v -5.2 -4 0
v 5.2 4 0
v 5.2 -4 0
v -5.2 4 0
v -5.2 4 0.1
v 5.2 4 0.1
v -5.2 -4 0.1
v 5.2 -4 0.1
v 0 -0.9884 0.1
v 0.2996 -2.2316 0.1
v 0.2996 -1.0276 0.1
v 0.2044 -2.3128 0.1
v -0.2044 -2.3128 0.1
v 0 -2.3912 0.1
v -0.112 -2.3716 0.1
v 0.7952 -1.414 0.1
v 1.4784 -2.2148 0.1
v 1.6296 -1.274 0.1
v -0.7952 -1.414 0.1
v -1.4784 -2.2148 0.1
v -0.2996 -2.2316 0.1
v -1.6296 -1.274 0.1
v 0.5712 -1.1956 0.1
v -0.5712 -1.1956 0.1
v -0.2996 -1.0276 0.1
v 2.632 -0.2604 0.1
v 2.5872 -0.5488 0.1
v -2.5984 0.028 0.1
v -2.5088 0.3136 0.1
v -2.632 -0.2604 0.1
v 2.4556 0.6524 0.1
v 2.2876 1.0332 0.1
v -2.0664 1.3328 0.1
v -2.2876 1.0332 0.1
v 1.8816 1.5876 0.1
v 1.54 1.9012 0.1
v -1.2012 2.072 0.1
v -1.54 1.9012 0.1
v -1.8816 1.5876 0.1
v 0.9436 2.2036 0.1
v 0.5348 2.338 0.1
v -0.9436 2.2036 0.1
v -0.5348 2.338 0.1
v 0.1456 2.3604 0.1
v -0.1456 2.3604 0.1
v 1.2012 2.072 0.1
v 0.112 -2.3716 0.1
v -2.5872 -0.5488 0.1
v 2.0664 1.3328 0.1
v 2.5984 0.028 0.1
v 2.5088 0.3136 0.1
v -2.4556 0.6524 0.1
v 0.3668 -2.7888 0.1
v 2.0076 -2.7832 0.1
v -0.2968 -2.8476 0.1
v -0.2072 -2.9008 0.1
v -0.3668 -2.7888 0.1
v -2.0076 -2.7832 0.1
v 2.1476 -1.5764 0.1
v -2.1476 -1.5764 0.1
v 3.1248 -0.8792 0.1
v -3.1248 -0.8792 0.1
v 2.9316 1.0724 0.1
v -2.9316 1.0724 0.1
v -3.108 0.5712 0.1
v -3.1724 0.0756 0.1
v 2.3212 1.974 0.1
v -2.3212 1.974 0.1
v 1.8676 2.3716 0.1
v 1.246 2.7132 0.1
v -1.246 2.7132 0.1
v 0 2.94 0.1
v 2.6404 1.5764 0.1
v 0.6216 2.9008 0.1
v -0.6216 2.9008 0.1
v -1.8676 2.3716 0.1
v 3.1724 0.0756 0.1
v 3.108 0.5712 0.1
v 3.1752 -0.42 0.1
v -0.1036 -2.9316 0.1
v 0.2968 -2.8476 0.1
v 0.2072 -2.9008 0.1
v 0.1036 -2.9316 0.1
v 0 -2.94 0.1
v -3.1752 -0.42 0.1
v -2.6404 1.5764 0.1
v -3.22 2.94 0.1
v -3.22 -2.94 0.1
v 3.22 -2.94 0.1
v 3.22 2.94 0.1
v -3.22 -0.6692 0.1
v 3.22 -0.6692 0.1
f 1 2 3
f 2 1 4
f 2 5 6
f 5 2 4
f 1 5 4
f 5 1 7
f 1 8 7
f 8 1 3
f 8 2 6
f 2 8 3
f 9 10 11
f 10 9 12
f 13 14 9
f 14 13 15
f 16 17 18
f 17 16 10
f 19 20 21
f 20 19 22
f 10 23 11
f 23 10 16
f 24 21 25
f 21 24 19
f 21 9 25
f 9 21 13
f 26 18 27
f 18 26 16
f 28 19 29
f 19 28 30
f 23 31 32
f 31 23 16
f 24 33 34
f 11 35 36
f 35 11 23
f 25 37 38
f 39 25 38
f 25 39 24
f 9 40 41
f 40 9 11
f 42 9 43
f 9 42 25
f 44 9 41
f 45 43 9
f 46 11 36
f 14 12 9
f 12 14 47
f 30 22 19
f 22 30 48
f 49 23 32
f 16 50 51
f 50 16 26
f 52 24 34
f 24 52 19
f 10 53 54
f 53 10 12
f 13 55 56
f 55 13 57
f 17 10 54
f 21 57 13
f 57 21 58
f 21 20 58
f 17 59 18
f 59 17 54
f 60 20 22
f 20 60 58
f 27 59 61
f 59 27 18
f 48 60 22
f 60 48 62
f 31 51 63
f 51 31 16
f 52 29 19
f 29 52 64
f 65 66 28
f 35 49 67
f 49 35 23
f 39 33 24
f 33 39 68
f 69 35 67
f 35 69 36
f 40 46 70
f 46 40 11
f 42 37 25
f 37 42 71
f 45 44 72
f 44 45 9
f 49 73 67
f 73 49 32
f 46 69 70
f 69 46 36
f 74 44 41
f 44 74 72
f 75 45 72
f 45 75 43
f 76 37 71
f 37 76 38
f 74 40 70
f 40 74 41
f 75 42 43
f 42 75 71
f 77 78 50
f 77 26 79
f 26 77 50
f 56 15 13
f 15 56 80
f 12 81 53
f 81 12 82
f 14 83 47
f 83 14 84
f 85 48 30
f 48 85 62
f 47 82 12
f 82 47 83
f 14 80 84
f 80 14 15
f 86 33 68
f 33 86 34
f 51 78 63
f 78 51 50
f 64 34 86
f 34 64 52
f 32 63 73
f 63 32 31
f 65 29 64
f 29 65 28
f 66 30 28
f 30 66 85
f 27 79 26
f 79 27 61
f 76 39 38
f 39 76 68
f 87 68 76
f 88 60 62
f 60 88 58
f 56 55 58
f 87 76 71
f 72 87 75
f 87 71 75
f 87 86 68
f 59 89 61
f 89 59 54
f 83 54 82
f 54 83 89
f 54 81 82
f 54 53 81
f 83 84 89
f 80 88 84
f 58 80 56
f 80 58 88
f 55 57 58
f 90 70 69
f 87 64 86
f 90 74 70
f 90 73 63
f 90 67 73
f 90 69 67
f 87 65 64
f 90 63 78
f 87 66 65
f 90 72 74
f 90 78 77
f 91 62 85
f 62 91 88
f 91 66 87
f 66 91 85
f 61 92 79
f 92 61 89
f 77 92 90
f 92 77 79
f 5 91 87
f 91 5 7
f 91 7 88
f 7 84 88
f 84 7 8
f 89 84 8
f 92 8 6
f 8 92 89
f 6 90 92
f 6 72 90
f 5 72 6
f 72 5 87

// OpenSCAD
// file: ../p/logo-shell-1971-outerbox.scad
use <../lib.scad>
function ldraw_lib__logo_shell_1971_outerbox() = [
// 0 Logo Shell 1971 Outerbox
// 0 Name: logo-shell-1971-outerbox.dat
// 0 Author: Vincent Messenet [Cheenzo]
// 0 !LDRAW_ORG Primitive UPDATE 2023-04
// 0 !LICENSE Licensed under CC BY 4.0 : see CAreadme.txt
// 
// 0 BFC CERTIFY CCW
  [0,"BFC","CERTIFY"],
  [0,"BFC","CCW"],
// 
// 0 !HISTORY 2023-06-28 [Cheenzo] Created based on 3004s60 by J. C. Tchang [tchang]
// 0 !HISTORY 2023-08-25 [OrionP] Official Update 2023-04
// 
// 
// 0 // Shell Logo 1971
// 0 // Size: x = -11.5 to 11.5 y = -10.5 to 10.5 z = 0
// 
// 3 16 -11.5 0 10.5 -8.29 0 7.05 -6.67 0 8.47
  [3,16,-11.5,0,10.5,-8.29,0,7.05,-6.67,0,8.47],
// 4 16 -7.17 0 -9.94 -7.67 0 -5.63 -11.16 0 -3.14 -11.5 0 -10.5
  [4,16,-7.17,0,-9.94,-7.67,0,-5.63,-11.16,0,-3.14,-11.5,0,-10.5],
// 3 16 -.74 0 -10.36 -1.06 0 -10.17 -7.17 0 -9.94
  [3,16,-.74,0,-10.36,-1.06,0,-10.17,-7.17,0,-9.94],
// 3 16 -11.5 0 10.5 -6.67 0 8.47 -4.45 0 9.69
  [3,16,-11.5,0,10.5,-6.67,0,8.47,-4.45,0,9.69],
// 3 16 0 0 10.5 -11.5 0 10.5 -2.22 0 10.36
  [3,16,0,0,10.5,-11.5,0,10.5,-2.22,0,10.36],
// 3 16 -11.5 0 10.5 -4.45 0 9.69 -2.22 0 10.36
  [3,16,-11.5,0,10.5,-4.45,0,9.69,-2.22,0,10.36],
// 3 16 -11.5 0 10.5 -9.43 0 5.63 -8.29 0 7.05
  [3,16,-11.5,0,10.5,-9.43,0,5.63,-8.29,0,7.05],
// 4 16 11.16 0 -3.14 7.67 0 -5.63 7.17 0 -9.94 11.5 0 -10.5
  [4,16,11.16,0,-3.14,7.67,0,-5.63,7.17,0,-9.94,11.5,0,-10.5],
// 4 16 11.5 0 -10.5 7.17 0 -9.94 .74 0 -10.36 .37 0 -10.47
  [4,16,11.5,0,-10.5,7.17,0,-9.94,.74,0,-10.36,.37,0,-10.47],
// 3 16 7.17 0 -9.94 1.06 0 -10.17 .74 0 -10.36
  [3,16,7.17,0,-9.94,1.06,0,-10.17,.74,0,-10.36],
// 3 16 7.17 0 -9.94 1.31 0 -9.96 1.06 0 -10.17
  [3,16,7.17,0,-9.94,1.31,0,-9.96,1.06,0,-10.17],
// 3 16 .37 0 -10.47 0 0 -10.5 11.5 0 -10.5
  [3,16,.37,0,-10.47,0,0,-10.5,11.5,0,-10.5],
// 3 16 -.37 0 -10.47 -11.5 0 -10.5 0 0 -10.5
  [3,16,-.37,0,-10.47,-11.5,0,-10.5,0,0,-10.5],
// 4 16 -.37 0 -10.47 -.74 0 -10.36 -7.17 0 -9.94 -11.5 0 -10.5
  [4,16,-.37,0,-10.47,-.74,0,-10.36,-7.17,0,-9.94,-11.5,0,-10.5],
// 3 16 -1.06 0 -10.17 -1.31 0 -9.96 -7.17 0 -9.94
  [3,16,-1.06,0,-10.17,-1.31,0,-9.96,-7.17,0,-9.94],
// 3 16 11.5 0 10.5 4.45 0 9.69 6.67 0 8.47
  [3,16,11.5,0,10.5,4.45,0,9.69,6.67,0,8.47],
// 3 16 -11.5 0 10.5 -10.47 0 3.83 -9.43 0 5.63
  [3,16,-11.5,0,10.5,-10.47,0,3.83,-9.43,0,5.63],
// 3 16 11.5 0 10.5 2.22 0 10.36 4.45 0 9.69
  [3,16,11.5,0,10.5,2.22,0,10.36,4.45,0,9.69],
// 3 16 11.5 0 10.5 9.43 0 5.63 10.47 0 3.83
  [3,16,11.5,0,10.5,9.43,0,5.63,10.47,0,3.83],
// 3 16 11.5 0 10.5 8.29 0 7.05 9.43 0 5.63
  [3,16,11.5,0,10.5,8.29,0,7.05,9.43,0,5.63],
// 3 16 11.5 0 10.5 6.67 0 8.47 8.29 0 7.05
  [3,16,11.5,0,10.5,6.67,0,8.47,8.29,0,7.05],
// 3 16 -11.5 0 10.5 -11.1 0 2.04 -10.47 0 3.83
  [3,16,-11.5,0,10.5,-11.1,0,2.04,-10.47,0,3.83],
// 3 16 11.5 0 10.5 10.47 0 3.83 11.1 0 2.04
  [3,16,11.5,0,10.5,10.47,0,3.83,11.1,0,2.04],
// 3 16 -11.5 0 10.5 -11.33 0 .27 -11.1 0 2.04
  [3,16,-11.5,0,10.5,-11.33,0,.27,-11.1,0,2.04],
// 3 16 11.5 0 10.5 0 0 10.5 2.22 0 10.36
  [3,16,11.5,0,10.5,0,0,10.5,2.22,0,10.36],
// 3 16 11.5 0 10.5 11.1 0 2.04 11.33 0 .27
  [3,16,11.5,0,10.5,11.1,0,2.04,11.33,0,.27],
// 4 16 -11.16 0 -3.14 -11.34 0 -1.5 -11.5 0 -2.39 -11.5 0 -10.5
  [4,16,-11.16,0,-3.14,-11.34,0,-1.5,-11.5,0,-2.39,-11.5,0,-10.5],
// 4 16 -11.34 0 -1.5 -11.33 0 .27 -11.5 0 10.5 -11.5 0 -2.39
  [4,16,-11.34,0,-1.5,-11.33,0,.27,-11.5,0,10.5,-11.5,0,-2.39],
// 4 16 11.5 0 -2.39 11.34 0 -1.5 11.16 0 -3.14 11.5 0 -10.5
  [4,16,11.5,0,-2.39,11.34,0,-1.5,11.16,0,-3.14,11.5,0,-10.5],
// 4 16 11.5 0 -2.39 11.5 0 10.5 11.33 0 .27 11.34 0 -1.5
  [4,16,11.5,0,-2.39,11.5,0,10.5,11.33,0,.27,11.34,0,-1.5],
];
module ldraw_lib__logo_shell_1971_outerbox(step=0, col=false, unit=2/5, alt=false, line=0.2, solid=!$preview)
    makepoly(ldraw_lib__logo_shell_1971_outerbox(), step=step, col=col, unit=unit, alt=alt, line=line, solid=solid);
ldraw_lib__logo_shell_1971_outerbox(line=0.2);
// file: ../p/box5-12.scad
use <../lib.scad>
function ldraw_lib__box5_12() = [
// 0 Box with 5 Faces without Any Edges
// 0 Name: box5-12.dat
// 0 Author: Chris Dee [cwdee]
// 0 !LDRAW_ORG Primitive UPDATE 2009-02
// 0 !LICENSE Licensed under CC BY 4.0 : see CAreadme.txt
// 
// 0 BFC CERTIFY CCW
  [0,"BFC","CERTIFY"],
  [0,"BFC","CCW"],
// 
// 0 !HISTORY 2009-09-03 [PTadmin] Official Update 2009-02
// 
// 
// 4 16 1 1 1 1 1 -1 -1 1 -1 -1 1 1
  [4,16,1,1,1,1,1,-1,-1,1,-1,-1,1,1],
// 4 16 -1 0 1 1 0 1 1 1 1 -1 1 1
  [4,16,-1,0,1,1,0,1,1,1,1,-1,1,1],
// 4 16 -1 0 -1 -1 0 1 -1 1 1 -1 1 -1
  [4,16,-1,0,-1,-1,0,1,-1,1,1,-1,1,-1],
// 4 16 1 0 -1 -1 0 -1 -1 1 -1 1 1 -1
  [4,16,1,0,-1,-1,0,-1,-1,1,-1,1,1,-1],
// 4 16 1 0 1 1 0 -1 1 1 -1 1 1 1
  [4,16,1,0,1,1,0,-1,1,1,-1,1,1,1],
// 0
];
module ldraw_lib__box5_12(step=0, col=false, unit=2/5, alt=false, line=0.2, solid=!$preview)
    makepoly(ldraw_lib__box5_12(), step=step, col=col, unit=unit, alt=alt, line=line, solid=solid);
ldraw_lib__box5_12(line=0.2);
// main file
use <../lib.scad>
use <../p/box5-12.scad>
use <../p/logo-shell-1971-outerbox.scad>
use <../p/logo-shell-1971.scad>
function ldraw_lib__003667c() = [
// 0 Sticker  1.0 x  1.3 with Shell Logo 1971
// 0 Name: 003667c.dat
// 0 Author: Willy Tschager [Holly-Wood]
// 0 !LDRAW_ORG Part UPDATE 2024-01
// 0 !LICENSE Licensed under CC BY 4.0 : see CAreadme.txt
// 
// 0 BFC CERTIFY CCW
  [0,"BFC","CERTIFY"],
  [0,"BFC","CCW"],
// 
// 0 !KEYWORDS Bricklink 619stk01, Brickowl 853878, Car, legoland, Race
// 0 !KEYWORDS Rebrickable 3667, set 619, town
// 
// 0 !HISTORY 2024-01-29 [OrionP] Official Update 2024-01
// 
// 0 // Small box
// 1 16 0 -.25 0 13 0 0 0 .25 0 0 0 10 box5-12.dat
  [1,16,0,-.25,0,13,0,0,0,.25,0,0,0,10, ldraw_lib__box5_12()],
// 
// 0 // Pattern
// 1 16 0 -.25 0 .7 0 0 0 1 0 0 0 .7 logo-shell-1971.dat
  [1,16,0,-.25,0,.7,0,0,0,1,0,0,0,.7, ldraw_lib__logo_shell_1971()],
// 1 15 0 -.25 0 .7 0 0 0 1 0 0 0 .7 logo-shell-1971-outerbox.dat
  [1,15,0,-.25,0,.7,0,0,0,1,0,0,0,.7, ldraw_lib__logo_shell_1971_outerbox()],
// 4 15 -8.05 -.25 -1.673 -8.05 -.25 7.35 -13 -.25 10 -13 -.25 -10
  [4,15,-8.05,-.25,-1.673,-8.05,-.25,7.35,-13,-.25,10,-13,-.25,-10],
// 3 15 -8.05 -.25 -1.673 -13 -.25 -10 -8.05 -.25 -7.35
  [3,15,-8.05,-.25,-1.673,-13,-.25,-10,-8.05,-.25,-7.35],
// 4 15 0 -.25 -7.35 -8.05 -.25 -7.35 -13 -.25 -10 13 -.25 -10
  [4,15,0,-.25,-7.35,-8.05,-.25,-7.35,-13,-.25,-10,13,-.25,-10],
// 3 15 8.05 -.25 -7.35 0 -.25 -7.35 13 -.25 -10
  [3,15,8.05,-.25,-7.35,0,-.25,-7.35,13,-.25,-10],
// 4 15 8.05 -.25 -1.673 8.05 -.25 -7.35 13 -.25 -10 13 -.25 10
  [4,15,8.05,-.25,-1.673,8.05,-.25,-7.35,13,-.25,-10,13,-.25,10],
// 3 15 13 -.25 10 8.05 -.25 7.35 8.05 -.25 -1.673
  [3,15,13,-.25,10,8.05,-.25,7.35,8.05,-.25,-1.673],
// 3 15 13 -.25 10 0 -.25 7.35 8.05 -.25 7.35
  [3,15,13,-.25,10,0,-.25,7.35,8.05,-.25,7.35],
// 4 15 -8.05 -.25 7.35 0 -.25 7.35 13 -.25 10 -13 -.25 10
  [4,15,-8.05,-.25,7.35,0,-.25,7.35,13,-.25,10,-13,-.25,10],
];
module ldraw_lib__003667c(step=0, col=false, unit=2/5, alt=false, line=0.2, solid=!$preview)
    makepoly(ldraw_lib__003667c(), step=step, col=col, unit=unit, alt=alt, line=line, solid=solid);
ldraw_lib__003667c(line=0.2);
